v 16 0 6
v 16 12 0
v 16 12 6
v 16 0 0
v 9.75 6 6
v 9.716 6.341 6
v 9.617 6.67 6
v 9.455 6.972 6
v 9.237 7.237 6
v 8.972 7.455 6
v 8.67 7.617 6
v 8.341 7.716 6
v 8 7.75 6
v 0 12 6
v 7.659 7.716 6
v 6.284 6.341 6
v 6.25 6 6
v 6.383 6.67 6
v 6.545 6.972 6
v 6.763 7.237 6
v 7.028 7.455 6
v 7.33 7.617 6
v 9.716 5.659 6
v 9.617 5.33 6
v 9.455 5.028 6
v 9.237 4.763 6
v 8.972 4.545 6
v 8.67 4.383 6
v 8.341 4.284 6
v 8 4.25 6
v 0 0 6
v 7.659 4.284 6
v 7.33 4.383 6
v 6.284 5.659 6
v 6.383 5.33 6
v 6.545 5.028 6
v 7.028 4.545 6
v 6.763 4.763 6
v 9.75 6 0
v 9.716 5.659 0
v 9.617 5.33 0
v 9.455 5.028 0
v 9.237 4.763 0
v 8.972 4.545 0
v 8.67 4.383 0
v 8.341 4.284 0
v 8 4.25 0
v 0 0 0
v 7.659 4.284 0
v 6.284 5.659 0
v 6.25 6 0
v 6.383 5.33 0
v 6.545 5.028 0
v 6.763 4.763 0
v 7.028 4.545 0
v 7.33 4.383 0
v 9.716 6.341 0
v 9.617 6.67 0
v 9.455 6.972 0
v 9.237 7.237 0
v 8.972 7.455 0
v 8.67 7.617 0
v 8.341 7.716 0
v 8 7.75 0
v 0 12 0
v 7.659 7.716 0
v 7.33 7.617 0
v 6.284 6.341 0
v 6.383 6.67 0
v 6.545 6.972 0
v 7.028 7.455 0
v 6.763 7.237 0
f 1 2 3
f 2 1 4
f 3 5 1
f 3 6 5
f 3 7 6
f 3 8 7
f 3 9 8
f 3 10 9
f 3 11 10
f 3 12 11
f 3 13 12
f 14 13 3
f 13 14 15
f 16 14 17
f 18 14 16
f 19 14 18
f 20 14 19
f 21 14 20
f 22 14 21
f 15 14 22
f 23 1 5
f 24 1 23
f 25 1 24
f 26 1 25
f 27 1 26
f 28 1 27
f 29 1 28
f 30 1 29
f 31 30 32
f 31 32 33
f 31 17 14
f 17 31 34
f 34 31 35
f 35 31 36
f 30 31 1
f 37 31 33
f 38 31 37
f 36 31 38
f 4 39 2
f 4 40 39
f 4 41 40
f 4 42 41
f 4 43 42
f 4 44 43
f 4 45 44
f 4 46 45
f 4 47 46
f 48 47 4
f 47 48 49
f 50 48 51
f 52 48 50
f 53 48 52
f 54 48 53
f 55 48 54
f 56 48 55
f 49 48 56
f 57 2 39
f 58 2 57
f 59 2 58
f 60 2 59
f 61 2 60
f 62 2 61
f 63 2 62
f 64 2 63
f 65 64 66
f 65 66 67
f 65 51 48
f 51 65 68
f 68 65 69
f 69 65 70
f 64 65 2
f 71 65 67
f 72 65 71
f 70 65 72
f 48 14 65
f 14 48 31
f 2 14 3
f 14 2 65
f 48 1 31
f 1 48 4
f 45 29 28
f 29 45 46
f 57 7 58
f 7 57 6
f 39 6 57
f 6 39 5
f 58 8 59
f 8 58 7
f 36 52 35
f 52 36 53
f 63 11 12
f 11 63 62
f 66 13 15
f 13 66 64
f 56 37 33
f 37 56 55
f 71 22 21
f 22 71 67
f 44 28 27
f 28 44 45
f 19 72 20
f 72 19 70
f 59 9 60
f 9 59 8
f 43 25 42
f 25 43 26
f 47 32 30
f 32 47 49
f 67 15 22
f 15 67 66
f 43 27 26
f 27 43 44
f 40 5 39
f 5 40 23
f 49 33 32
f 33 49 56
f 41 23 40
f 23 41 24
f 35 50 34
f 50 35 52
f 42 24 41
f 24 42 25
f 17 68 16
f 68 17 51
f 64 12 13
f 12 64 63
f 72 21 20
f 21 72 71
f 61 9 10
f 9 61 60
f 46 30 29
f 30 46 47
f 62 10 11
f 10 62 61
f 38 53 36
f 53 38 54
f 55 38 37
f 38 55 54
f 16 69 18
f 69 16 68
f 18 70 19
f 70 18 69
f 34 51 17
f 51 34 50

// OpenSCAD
$fn = 32;

// ----------------------------------------------------------------------
// Micro pad: drilled pad, 5-20 mm class
// ----------------------------------------------------------------------

// --- parameters (mm) ---
pad_l = 16;               // pad length, X
pad_w = 12;               // pad width, Y
pad_t = 6;                // pad thickness, Z
hole_d = 3.5;             // through hole diameter

difference() {
  cube([pad_l, pad_w, pad_t]);
  translate([pad_l / 2, pad_w / 2, -1])
    cylinder(h = pad_t + 2, d = hole_d);
}
